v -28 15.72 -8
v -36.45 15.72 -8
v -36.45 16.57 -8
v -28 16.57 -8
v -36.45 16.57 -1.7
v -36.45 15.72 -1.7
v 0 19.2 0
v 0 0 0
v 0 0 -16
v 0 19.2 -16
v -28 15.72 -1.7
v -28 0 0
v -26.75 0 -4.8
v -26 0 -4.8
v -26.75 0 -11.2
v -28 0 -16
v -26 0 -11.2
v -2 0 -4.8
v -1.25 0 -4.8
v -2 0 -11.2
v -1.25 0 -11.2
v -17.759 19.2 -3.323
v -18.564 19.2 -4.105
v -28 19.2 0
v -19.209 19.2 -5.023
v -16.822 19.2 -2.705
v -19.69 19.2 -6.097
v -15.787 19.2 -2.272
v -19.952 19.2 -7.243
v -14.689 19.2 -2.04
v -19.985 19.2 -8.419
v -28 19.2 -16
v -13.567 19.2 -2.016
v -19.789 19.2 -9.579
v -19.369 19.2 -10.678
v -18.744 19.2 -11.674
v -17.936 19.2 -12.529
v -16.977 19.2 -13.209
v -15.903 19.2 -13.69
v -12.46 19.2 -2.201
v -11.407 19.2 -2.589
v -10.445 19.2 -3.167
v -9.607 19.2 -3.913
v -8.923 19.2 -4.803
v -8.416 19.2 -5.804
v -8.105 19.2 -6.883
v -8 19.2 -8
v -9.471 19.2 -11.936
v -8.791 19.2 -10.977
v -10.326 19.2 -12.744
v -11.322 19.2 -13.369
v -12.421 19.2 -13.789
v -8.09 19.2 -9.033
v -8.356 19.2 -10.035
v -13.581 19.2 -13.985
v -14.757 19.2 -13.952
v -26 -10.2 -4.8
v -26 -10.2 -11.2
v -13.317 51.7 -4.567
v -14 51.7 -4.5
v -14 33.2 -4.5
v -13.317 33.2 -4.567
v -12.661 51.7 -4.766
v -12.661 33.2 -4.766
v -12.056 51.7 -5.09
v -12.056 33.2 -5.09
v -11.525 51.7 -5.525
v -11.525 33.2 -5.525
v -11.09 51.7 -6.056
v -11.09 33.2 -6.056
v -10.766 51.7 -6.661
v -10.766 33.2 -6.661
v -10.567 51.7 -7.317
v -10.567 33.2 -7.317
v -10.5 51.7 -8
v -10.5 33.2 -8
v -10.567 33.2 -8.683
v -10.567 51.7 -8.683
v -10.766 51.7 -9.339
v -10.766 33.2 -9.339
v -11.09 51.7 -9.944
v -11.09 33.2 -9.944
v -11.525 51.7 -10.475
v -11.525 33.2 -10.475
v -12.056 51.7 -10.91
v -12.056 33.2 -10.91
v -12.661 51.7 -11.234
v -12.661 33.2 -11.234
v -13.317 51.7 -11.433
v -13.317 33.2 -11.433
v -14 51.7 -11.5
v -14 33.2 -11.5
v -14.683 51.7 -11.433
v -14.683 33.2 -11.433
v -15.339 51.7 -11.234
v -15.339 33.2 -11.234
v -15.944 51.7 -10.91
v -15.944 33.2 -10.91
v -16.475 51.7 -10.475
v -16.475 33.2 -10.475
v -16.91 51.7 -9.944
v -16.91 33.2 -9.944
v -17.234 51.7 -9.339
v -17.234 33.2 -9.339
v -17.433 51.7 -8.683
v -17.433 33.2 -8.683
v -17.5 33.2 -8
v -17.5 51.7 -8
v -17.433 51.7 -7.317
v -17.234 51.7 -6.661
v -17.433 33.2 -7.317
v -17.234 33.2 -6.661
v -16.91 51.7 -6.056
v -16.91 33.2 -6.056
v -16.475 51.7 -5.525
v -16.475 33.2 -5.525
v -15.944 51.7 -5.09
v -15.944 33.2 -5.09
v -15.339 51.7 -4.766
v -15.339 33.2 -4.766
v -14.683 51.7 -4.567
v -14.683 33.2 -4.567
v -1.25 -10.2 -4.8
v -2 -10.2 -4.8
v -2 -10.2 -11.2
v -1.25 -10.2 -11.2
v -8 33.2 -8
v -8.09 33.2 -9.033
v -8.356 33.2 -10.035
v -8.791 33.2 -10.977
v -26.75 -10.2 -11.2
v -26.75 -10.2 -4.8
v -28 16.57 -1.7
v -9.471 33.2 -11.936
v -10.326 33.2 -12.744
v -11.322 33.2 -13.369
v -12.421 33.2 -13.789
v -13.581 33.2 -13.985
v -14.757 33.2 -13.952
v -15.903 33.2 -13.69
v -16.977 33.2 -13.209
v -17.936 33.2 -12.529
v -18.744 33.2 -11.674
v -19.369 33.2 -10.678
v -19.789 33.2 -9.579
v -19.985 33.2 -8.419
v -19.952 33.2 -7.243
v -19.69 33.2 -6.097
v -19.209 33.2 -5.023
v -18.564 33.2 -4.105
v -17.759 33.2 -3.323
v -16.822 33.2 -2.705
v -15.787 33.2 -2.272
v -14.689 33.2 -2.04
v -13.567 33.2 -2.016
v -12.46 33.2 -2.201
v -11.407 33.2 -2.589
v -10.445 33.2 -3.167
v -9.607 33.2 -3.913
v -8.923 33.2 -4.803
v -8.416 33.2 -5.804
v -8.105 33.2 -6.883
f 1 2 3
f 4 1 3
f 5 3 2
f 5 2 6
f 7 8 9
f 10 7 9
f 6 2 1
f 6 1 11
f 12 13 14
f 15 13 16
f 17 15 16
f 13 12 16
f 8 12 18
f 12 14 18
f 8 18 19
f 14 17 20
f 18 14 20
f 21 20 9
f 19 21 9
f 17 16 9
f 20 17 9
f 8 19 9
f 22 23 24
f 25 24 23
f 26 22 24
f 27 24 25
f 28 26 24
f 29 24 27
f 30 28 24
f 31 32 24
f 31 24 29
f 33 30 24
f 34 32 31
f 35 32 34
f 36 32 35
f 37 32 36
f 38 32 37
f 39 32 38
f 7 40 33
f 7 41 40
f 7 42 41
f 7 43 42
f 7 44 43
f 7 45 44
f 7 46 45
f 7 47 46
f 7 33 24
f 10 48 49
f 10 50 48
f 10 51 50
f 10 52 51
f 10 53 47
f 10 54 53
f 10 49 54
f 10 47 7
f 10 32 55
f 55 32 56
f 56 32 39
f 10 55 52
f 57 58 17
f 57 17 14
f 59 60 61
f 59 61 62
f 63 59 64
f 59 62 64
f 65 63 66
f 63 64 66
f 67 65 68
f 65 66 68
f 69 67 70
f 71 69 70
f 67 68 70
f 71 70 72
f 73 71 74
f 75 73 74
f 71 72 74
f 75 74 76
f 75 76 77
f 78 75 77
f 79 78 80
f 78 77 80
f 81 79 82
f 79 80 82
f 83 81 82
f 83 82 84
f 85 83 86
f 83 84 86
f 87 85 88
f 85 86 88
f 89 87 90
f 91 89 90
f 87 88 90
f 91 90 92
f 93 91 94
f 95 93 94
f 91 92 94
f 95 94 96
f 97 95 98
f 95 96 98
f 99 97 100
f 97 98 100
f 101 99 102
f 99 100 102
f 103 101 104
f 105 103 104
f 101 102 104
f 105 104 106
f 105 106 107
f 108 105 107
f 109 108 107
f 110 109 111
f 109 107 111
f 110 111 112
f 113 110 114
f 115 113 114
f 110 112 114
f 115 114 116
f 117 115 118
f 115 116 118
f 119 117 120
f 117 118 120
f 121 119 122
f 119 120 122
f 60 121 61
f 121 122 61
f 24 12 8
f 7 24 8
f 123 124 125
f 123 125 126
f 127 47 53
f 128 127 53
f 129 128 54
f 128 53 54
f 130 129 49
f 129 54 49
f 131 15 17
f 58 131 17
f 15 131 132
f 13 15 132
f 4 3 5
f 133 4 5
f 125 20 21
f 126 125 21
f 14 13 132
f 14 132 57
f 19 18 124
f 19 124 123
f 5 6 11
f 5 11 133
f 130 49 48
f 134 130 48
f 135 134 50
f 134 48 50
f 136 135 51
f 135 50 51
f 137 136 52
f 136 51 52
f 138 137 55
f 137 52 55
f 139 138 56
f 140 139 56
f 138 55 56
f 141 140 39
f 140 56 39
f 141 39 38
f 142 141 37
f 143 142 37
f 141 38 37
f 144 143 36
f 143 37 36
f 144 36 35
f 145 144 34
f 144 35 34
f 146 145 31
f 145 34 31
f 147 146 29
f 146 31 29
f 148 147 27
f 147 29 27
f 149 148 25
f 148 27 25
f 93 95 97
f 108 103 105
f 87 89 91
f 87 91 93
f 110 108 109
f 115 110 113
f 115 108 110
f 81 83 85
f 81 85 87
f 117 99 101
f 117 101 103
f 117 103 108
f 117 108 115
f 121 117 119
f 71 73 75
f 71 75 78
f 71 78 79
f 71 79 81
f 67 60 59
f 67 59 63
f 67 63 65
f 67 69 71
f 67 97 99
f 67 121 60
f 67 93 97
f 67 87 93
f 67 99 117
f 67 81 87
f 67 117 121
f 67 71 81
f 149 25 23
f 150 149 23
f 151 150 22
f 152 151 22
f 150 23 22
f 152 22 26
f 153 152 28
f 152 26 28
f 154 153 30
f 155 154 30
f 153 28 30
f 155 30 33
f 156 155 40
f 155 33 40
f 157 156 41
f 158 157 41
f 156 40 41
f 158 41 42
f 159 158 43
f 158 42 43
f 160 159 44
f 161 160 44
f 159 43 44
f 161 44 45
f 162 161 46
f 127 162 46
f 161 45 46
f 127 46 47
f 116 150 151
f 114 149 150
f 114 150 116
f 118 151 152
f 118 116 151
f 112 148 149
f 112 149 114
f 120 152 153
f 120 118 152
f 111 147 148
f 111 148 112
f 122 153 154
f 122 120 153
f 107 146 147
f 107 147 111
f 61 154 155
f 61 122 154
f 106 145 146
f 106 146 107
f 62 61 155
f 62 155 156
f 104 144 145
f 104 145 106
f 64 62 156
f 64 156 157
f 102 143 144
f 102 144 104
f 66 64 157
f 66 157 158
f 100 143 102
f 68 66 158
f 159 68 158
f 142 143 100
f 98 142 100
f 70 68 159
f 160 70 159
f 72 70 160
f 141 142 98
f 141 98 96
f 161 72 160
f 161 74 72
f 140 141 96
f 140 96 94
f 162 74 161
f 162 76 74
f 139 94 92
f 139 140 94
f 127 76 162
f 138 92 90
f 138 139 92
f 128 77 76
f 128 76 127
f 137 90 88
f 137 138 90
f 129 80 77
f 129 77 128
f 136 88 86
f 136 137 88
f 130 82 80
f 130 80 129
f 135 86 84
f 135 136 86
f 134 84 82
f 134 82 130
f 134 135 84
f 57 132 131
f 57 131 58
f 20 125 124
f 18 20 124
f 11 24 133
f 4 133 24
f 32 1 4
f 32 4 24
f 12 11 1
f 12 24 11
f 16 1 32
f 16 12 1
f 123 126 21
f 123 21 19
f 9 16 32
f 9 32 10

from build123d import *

# Parameters (mm, degrees)
SKETCH1_W           = 28
SKETCH1_H           = 16
BOSS_EXTRUDE1_DEPTH = 19.2
SKETCH2_W           = 0.75
SKETCH2_H           = 6.4
BOSS_EXTRUDE2_DEPTH = 10.2
SKETCH3_W           = 6.3
SKETCH3_H           = 0.85
BOSS_EXTRUDE3_DEPTH = 8.45
BOSS_EXTRUDE4_DEPTH = 14
SKETCH5_R           = 3.5
BOSS_EXTRUDE5_DEPTH = 18.5


with BuildPart() as part:
    # Sketch1 → Boss-Extrude1 (new body)
    with BuildSketch(Plane(origin=(0, 0, 0), x_dir=(1, 0, 0), z_dir=(0, 1, 0))):
        with Locations((-14, 8)):
            Rectangle(SKETCH1_W, SKETCH1_H)
    extrude(amount=BOSS_EXTRUDE1_DEPTH)

    # Sketch2 → Boss-Extrude2 (add)
    with BuildSketch(Plane.XZ):
        with Locations((-1.625, -8)):
            Rectangle(SKETCH2_W, SKETCH2_H)
        with Locations((-26.375, -8)):
            Rectangle(SKETCH2_W, SKETCH2_H)
    extrude(amount=BOSS_EXTRUDE2_DEPTH)

    # Sketch3 → Boss-Extrude3 (add)
    with BuildSketch(Plane.ZY.offset(28)):
        with Locations((-4.85, 16.145)):
            Rectangle(SKETCH3_W, SKETCH3_H)
    extrude(amount=BOSS_EXTRUDE3_DEPTH)

    # Sketch4 → Boss-Extrude4 (add)
    with BuildSketch(Plane(origin=(0, 19.2, 0), x_dir=(1, 0, 0), z_dir=(0, 1, 0))):
        with BuildLine():
            ThreePointArc((-8.790541147, 10.97683363), (-16.97683363, 13.209458853), (-19.209458853, 5.02316637))
            Line((-19.209458853, 5.02316637), (-8.790541147, 10.97683363))
        make_face()
        with BuildLine():
            Line((-8.790541147, 10.97683363), (-19.209458853, 5.02316637))
            ThreePointArc((-19.209458853, 5.02316637), (-12.459992389, 2.201002107), (-8, 8))
            ThreePointArc((-8, 8), (-8.201002107, 9.540007611), (-8.790541147, 10.97683363))
        make_face()
    extrude(amount=BOSS_EXTRUDE4_DEPTH)

    # Sketch5 → Boss-Extrude5 (add)
    with BuildSketch(Plane(origin=(0, 33.2, 0), x_dir=(1, 0, 0), z_dir=(0, 1, 0))):
        with Locations(Location((-14, 8, 0), (0, 0, 270))):
            Circle(SKETCH5_R)
    extrude(amount=BOSS_EXTRUDE5_DEPTH)


solid = part.part
